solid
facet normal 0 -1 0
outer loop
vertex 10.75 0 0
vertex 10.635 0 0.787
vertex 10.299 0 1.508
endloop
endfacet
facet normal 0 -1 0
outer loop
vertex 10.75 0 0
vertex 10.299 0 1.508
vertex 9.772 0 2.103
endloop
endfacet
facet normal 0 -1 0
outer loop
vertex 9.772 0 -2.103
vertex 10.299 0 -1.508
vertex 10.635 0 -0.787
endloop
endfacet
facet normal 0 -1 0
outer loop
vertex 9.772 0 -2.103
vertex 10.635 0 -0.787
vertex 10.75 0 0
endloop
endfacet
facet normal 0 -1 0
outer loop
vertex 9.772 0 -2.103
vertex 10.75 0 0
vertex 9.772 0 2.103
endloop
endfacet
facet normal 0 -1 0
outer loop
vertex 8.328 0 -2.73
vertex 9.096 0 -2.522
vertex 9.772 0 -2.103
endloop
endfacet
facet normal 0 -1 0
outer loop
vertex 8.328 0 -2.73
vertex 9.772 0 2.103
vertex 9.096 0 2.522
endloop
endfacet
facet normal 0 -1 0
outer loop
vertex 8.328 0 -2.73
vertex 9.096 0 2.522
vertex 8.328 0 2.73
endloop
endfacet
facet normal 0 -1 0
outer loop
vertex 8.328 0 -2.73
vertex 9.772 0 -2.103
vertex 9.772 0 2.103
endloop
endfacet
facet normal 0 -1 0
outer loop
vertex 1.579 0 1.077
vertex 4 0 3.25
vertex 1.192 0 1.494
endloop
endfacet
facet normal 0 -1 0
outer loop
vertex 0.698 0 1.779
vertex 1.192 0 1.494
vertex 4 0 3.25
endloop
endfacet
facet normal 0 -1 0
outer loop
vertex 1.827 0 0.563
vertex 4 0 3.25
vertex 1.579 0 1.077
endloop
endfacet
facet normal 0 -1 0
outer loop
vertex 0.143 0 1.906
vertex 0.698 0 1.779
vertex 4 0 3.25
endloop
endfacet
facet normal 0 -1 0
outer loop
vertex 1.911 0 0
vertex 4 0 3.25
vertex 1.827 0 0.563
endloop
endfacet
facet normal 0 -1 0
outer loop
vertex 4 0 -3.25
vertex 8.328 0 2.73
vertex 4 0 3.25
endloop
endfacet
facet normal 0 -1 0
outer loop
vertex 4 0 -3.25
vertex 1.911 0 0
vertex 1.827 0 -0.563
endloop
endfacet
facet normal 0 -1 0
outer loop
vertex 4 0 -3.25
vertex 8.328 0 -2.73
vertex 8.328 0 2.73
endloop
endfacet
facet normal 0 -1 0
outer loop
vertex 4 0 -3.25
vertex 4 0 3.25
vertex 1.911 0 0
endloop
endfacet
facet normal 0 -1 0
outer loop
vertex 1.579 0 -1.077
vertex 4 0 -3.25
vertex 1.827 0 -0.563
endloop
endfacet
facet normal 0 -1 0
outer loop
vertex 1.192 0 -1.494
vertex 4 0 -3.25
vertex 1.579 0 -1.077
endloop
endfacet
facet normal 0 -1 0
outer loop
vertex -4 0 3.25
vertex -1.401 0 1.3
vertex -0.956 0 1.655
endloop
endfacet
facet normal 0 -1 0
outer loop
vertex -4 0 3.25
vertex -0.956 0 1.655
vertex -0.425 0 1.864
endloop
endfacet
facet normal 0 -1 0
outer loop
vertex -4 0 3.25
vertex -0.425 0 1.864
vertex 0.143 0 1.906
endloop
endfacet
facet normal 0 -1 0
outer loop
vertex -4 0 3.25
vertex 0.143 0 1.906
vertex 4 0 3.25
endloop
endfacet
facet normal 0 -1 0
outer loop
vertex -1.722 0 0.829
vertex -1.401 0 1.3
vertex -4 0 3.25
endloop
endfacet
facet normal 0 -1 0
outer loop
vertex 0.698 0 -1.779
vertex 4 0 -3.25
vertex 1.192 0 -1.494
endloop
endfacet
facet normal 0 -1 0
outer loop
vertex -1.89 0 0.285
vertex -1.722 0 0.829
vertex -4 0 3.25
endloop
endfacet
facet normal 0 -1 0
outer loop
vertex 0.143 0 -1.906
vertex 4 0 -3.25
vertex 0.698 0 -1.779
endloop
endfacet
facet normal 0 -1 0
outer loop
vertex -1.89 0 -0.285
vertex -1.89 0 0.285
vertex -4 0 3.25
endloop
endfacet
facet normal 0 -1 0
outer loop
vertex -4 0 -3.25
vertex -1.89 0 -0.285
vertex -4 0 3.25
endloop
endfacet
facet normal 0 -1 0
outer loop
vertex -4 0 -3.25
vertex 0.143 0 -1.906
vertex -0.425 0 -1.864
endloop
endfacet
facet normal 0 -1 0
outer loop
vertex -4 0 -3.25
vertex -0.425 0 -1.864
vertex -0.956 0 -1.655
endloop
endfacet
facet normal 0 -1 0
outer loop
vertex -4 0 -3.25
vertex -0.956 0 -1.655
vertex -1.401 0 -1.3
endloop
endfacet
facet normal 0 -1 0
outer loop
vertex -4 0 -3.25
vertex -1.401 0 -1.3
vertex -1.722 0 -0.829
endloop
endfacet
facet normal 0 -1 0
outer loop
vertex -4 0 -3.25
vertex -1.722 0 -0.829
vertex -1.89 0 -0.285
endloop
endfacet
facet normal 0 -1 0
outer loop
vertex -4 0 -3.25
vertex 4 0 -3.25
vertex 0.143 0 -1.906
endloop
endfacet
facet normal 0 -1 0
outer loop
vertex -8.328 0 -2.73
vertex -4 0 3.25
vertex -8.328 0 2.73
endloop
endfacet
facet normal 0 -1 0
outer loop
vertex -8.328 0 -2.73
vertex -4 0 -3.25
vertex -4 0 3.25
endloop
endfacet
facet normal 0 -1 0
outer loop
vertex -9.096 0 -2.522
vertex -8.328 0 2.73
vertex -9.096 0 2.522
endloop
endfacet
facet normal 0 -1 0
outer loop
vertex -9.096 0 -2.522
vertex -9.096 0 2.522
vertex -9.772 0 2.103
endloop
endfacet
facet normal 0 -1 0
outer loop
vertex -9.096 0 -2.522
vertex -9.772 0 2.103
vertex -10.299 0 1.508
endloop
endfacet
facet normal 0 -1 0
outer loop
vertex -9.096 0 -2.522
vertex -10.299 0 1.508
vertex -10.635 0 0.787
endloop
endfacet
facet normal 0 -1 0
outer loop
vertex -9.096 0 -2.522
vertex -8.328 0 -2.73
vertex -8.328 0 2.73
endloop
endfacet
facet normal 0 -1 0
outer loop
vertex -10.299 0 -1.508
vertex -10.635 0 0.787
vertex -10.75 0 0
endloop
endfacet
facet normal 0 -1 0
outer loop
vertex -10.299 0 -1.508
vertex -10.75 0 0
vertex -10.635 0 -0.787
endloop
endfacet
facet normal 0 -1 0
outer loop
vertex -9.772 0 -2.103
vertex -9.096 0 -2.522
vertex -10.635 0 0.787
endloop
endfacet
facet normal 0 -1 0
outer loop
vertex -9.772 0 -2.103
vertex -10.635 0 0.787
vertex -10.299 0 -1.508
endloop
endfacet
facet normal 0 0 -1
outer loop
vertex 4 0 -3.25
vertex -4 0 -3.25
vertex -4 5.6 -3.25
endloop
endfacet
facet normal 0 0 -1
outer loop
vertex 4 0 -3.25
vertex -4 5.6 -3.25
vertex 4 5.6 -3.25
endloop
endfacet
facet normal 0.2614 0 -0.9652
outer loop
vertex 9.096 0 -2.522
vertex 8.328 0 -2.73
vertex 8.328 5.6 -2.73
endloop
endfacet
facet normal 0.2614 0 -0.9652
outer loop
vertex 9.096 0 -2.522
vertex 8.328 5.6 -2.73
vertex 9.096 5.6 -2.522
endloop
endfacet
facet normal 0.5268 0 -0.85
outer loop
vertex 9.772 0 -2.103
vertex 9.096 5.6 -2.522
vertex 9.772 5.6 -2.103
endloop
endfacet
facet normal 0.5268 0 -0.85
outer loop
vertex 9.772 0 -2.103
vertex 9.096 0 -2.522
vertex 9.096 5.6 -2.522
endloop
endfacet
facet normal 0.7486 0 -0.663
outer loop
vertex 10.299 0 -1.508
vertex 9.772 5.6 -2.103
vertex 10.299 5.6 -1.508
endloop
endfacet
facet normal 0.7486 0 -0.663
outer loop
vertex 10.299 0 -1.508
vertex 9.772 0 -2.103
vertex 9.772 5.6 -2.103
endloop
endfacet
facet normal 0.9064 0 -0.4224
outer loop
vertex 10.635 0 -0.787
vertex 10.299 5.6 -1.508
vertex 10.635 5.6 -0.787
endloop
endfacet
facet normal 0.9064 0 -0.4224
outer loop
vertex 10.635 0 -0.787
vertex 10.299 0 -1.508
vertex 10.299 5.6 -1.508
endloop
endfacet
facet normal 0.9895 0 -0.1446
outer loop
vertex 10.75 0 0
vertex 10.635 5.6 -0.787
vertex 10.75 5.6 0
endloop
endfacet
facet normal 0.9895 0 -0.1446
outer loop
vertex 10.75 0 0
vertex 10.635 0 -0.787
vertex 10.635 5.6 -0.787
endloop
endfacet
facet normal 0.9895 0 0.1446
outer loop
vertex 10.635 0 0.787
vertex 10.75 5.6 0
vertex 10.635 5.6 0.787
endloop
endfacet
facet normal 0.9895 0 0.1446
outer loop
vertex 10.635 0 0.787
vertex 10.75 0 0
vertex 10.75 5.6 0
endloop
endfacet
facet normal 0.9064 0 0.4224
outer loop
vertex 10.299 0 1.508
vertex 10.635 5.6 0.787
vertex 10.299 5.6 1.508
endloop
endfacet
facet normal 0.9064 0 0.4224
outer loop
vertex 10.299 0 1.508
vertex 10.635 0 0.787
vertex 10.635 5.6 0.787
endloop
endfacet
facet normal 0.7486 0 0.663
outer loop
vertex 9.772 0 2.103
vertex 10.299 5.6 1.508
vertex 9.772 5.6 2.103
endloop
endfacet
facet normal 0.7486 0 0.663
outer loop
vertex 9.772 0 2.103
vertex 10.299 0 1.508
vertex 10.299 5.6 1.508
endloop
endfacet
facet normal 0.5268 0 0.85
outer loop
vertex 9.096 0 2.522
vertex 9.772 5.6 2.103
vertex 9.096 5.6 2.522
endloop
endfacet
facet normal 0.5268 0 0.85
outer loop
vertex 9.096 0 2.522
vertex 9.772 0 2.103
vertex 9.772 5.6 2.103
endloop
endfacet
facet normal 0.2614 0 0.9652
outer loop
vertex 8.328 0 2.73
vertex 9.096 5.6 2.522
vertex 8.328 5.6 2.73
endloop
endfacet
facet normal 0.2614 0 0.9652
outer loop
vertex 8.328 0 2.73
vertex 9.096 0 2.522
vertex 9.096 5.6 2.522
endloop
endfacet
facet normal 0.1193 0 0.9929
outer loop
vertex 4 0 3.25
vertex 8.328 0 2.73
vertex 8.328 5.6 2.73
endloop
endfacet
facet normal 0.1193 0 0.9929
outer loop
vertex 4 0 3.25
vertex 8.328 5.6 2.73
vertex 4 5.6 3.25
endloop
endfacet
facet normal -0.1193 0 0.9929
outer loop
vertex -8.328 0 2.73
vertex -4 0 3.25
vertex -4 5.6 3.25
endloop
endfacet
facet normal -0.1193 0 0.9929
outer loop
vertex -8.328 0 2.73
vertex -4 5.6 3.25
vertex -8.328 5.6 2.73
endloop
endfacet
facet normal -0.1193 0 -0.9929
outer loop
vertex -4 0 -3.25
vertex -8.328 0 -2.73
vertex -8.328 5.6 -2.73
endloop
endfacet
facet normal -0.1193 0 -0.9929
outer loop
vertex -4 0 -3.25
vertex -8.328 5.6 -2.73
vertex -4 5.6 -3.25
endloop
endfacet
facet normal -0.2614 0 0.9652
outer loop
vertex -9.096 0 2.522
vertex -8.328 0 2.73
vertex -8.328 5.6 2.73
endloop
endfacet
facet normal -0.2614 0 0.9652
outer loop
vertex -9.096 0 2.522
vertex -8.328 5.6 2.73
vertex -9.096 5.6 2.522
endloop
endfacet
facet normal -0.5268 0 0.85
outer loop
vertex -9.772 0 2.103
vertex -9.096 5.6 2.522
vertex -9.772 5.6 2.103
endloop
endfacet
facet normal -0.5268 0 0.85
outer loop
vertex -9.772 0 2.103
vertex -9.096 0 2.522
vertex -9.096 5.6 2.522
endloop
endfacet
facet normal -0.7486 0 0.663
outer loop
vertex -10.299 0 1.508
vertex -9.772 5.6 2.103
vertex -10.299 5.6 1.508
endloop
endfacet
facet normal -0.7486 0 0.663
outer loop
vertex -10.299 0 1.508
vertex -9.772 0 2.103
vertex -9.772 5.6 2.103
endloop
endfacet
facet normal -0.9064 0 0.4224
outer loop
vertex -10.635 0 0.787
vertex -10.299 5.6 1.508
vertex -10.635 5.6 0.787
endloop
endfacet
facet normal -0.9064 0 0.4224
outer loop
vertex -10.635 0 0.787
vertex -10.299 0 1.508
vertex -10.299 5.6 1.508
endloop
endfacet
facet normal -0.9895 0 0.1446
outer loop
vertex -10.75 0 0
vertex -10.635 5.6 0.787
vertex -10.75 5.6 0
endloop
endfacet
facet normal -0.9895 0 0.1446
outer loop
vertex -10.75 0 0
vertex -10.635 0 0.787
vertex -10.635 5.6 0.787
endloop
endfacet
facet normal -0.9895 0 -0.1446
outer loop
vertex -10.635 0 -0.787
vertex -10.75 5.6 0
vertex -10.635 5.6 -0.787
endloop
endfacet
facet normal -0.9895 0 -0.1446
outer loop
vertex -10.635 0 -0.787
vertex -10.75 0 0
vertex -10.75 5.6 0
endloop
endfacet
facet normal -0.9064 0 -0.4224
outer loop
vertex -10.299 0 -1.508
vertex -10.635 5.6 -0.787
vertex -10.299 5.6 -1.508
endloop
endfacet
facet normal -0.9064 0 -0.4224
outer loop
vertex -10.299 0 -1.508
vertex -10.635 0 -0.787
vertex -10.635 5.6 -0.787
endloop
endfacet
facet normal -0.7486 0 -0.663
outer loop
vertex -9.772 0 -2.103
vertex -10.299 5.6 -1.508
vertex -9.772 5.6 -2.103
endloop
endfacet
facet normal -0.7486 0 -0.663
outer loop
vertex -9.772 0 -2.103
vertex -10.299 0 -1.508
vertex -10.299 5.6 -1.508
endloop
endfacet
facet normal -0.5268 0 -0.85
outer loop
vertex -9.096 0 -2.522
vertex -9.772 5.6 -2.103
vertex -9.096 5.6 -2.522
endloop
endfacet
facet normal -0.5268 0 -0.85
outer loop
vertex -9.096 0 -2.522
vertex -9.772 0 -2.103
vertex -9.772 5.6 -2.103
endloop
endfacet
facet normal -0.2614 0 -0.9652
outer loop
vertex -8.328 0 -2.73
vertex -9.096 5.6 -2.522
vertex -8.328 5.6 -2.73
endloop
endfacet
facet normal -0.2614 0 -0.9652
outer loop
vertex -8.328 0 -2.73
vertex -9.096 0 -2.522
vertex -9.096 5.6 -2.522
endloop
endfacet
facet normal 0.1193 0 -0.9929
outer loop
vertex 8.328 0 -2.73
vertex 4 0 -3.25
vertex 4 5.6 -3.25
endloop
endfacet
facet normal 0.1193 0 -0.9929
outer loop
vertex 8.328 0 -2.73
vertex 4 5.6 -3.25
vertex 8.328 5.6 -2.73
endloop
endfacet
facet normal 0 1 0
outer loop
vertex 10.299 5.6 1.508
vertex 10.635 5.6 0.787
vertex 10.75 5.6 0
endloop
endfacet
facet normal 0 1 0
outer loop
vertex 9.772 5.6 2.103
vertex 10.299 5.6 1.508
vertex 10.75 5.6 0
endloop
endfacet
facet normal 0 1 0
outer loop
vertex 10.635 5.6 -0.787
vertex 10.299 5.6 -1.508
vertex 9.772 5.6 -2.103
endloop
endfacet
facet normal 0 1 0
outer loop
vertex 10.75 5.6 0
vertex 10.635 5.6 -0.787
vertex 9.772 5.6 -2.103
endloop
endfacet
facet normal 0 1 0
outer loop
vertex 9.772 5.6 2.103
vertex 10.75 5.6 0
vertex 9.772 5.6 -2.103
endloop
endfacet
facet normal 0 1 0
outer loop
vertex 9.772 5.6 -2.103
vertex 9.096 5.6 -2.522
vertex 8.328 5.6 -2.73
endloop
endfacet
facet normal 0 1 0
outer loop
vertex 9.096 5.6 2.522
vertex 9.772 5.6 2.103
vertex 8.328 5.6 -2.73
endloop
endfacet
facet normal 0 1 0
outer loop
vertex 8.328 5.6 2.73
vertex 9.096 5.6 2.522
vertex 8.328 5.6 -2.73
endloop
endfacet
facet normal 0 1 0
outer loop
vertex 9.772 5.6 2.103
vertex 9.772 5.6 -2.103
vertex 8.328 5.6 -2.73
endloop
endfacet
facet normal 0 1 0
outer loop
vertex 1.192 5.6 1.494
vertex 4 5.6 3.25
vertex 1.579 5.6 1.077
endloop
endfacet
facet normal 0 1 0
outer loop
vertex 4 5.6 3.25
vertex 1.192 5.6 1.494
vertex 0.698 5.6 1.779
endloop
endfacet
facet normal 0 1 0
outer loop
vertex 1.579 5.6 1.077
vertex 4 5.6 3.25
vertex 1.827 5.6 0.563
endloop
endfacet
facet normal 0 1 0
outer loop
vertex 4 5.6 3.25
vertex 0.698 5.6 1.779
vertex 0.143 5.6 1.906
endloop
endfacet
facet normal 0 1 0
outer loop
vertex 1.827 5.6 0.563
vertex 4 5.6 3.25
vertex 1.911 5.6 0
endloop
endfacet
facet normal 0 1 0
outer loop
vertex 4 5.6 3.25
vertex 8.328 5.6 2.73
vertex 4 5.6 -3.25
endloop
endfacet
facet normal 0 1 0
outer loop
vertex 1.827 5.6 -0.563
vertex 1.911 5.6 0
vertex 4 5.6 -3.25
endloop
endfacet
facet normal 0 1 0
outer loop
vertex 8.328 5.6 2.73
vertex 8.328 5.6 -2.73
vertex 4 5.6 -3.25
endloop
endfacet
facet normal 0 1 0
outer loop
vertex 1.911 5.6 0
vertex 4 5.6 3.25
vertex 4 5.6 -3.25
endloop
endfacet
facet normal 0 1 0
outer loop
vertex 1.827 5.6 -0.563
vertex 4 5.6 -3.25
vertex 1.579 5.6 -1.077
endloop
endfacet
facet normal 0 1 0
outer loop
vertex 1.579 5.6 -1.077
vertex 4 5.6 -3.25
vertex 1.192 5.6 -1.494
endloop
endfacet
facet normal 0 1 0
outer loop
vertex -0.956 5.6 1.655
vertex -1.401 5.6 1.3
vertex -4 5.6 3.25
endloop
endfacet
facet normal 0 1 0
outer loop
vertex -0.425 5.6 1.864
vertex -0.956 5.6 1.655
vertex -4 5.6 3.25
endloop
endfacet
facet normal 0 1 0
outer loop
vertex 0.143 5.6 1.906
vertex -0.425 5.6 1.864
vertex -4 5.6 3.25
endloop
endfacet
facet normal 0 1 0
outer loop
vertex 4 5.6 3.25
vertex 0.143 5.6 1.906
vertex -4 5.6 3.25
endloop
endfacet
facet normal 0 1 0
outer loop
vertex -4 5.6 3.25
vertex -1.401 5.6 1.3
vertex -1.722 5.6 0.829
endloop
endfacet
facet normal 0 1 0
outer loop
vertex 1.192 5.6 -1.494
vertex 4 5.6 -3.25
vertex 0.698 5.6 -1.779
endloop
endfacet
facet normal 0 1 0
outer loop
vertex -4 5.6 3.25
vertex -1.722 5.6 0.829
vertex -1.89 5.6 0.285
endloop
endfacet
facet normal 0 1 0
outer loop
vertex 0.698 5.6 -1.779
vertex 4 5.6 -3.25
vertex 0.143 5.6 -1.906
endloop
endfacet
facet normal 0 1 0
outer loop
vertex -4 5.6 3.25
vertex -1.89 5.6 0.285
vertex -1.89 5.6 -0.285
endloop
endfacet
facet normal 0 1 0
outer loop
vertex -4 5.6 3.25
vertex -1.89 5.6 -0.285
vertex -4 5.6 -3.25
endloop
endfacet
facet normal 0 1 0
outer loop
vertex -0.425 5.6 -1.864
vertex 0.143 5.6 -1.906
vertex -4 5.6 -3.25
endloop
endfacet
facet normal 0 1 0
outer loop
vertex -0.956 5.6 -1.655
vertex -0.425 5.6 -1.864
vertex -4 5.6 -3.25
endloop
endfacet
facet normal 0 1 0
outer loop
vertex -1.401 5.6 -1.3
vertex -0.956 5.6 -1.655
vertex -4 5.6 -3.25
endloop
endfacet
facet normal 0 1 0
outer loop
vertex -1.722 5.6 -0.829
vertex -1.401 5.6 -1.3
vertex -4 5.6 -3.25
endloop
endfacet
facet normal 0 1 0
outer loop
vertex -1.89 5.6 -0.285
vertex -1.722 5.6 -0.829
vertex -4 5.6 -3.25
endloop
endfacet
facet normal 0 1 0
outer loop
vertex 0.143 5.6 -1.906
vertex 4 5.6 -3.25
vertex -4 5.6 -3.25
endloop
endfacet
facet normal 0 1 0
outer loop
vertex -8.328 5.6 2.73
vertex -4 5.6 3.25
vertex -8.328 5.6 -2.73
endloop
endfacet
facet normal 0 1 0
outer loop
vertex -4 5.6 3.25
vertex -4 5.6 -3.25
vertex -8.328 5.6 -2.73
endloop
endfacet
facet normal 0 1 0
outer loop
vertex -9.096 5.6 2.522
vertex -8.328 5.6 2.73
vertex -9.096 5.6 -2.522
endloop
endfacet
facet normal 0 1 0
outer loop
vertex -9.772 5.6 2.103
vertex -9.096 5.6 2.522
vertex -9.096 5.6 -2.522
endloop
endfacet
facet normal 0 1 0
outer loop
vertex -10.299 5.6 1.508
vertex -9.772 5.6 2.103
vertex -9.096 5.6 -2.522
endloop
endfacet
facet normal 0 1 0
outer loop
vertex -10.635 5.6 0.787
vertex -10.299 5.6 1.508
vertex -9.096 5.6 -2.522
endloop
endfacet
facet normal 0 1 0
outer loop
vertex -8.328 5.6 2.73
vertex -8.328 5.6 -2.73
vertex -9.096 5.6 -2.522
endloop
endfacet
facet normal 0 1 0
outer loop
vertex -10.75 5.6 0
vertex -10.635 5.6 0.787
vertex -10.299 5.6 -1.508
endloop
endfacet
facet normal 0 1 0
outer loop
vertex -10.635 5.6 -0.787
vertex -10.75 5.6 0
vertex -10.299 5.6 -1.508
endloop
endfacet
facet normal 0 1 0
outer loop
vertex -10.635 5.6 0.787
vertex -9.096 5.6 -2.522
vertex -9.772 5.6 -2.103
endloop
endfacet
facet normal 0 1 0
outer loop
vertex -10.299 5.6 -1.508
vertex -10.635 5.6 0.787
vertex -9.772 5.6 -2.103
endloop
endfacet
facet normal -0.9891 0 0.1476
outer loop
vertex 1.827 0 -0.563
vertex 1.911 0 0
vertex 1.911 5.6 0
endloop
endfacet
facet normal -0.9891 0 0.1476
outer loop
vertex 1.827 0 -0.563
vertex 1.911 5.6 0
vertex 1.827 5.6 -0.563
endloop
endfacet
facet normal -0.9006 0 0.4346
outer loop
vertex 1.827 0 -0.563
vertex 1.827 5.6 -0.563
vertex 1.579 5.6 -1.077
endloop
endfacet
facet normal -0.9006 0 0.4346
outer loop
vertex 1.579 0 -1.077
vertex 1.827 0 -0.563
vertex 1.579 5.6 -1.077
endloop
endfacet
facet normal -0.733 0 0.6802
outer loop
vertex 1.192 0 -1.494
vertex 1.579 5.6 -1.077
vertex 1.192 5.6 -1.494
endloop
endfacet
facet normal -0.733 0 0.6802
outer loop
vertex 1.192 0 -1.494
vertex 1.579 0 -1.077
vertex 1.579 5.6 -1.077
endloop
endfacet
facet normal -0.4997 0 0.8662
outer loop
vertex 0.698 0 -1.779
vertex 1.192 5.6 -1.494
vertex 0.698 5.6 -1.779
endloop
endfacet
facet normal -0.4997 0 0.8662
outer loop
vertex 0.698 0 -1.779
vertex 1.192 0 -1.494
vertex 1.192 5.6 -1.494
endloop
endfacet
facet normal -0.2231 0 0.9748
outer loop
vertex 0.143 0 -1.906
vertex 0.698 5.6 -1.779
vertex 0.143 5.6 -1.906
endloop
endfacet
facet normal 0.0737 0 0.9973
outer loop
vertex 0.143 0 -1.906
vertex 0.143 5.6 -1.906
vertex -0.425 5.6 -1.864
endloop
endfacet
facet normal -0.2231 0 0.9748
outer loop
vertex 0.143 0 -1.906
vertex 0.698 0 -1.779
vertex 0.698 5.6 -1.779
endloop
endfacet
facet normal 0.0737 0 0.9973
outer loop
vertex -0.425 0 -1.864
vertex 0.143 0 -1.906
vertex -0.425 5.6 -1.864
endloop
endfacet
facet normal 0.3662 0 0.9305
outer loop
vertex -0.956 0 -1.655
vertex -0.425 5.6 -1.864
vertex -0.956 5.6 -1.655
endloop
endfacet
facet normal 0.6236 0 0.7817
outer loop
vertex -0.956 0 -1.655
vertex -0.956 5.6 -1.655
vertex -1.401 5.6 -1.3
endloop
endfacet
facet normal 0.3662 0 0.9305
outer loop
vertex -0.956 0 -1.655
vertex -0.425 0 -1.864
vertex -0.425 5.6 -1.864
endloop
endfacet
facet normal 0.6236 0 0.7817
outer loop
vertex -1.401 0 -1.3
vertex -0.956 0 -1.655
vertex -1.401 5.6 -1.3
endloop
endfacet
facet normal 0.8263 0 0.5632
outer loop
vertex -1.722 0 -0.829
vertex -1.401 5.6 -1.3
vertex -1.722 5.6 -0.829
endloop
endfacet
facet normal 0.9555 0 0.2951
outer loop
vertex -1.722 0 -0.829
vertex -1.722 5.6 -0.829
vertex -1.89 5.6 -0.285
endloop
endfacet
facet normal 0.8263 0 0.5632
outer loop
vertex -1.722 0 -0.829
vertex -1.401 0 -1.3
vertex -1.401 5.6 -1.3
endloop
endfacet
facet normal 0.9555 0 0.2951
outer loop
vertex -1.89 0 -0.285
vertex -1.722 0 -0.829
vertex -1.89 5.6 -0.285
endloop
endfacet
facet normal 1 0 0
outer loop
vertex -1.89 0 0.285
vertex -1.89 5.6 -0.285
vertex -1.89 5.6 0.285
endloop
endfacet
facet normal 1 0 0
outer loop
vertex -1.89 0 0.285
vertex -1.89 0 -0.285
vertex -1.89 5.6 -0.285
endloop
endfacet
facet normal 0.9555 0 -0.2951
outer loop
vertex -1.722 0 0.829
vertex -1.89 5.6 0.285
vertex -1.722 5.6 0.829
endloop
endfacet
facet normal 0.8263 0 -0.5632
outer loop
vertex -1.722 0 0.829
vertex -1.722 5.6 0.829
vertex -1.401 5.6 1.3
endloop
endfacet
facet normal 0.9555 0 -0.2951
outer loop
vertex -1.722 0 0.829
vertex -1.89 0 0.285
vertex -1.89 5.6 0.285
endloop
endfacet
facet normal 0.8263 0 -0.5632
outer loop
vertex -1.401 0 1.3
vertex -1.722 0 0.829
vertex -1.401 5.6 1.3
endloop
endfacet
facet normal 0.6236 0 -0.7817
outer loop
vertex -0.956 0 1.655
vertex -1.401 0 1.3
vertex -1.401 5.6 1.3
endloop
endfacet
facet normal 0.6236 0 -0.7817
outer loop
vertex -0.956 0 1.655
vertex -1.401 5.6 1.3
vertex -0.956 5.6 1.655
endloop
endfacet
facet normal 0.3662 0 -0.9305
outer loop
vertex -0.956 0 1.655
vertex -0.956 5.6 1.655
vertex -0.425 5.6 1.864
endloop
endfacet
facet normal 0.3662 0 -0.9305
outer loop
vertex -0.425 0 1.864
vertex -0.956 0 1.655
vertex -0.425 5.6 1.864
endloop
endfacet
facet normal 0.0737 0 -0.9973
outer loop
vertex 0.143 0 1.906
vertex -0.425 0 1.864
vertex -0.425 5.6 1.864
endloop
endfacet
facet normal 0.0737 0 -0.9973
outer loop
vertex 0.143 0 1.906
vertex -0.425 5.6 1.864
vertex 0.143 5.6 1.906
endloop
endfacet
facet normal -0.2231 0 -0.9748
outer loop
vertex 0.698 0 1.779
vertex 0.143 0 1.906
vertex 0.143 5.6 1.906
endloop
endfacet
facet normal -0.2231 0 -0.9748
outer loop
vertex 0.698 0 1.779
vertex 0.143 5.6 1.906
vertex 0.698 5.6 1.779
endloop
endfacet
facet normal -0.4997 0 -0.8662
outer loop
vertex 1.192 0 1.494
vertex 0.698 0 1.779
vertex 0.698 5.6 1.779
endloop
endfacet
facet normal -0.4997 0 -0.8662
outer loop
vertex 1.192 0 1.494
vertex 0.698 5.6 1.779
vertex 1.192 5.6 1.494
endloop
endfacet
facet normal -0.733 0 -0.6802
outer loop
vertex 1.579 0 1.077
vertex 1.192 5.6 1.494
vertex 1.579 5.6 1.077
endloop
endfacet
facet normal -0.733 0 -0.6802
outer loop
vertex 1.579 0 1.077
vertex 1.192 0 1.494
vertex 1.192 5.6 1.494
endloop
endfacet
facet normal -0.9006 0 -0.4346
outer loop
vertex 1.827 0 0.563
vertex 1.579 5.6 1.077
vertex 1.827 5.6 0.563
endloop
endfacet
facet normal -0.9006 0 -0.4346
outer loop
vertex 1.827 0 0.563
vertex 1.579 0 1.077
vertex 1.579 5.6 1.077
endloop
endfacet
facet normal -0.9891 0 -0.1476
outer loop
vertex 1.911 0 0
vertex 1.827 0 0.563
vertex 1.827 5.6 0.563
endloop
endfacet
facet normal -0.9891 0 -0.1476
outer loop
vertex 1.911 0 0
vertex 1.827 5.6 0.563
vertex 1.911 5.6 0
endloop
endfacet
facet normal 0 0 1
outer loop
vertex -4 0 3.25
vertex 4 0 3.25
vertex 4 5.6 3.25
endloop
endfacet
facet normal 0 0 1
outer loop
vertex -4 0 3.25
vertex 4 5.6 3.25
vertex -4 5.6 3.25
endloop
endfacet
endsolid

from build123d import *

# Parameters (mm, degrees)
SKETCH4_R           = 1.911425658
BOSS_EXTRUDE1_DEPTH = 5.6


with BuildPart() as part:
    # Sketch4 → Boss-Extrude1 (new body)
    with BuildSketch(Plane(origin=(0, 0, 0), x_dir=(1, 0, 0), z_dir=(0, 1, 0))):
        with BuildLine():
            Line((-4, -3.25), (-8.327817762, -2.730391092))
            ThreePointArc((-8.327817762, -2.730391092), (-10.75, 0), (-8.327817762, 2.730391092))
            Line((-8.327817762, 2.730391092), (-4, 3.25))
            Line((-4, 3.25), (4, 3.25))
            Line((4, 3.25), (8.327817762, 2.730391092))
            ThreePointArc((8.327817762, 2.730391092), (10.75, 0), (8.327817762, -2.730391092))
            Line((8.327817762, -2.730391092), (4, -3.25))
            Line((4, -3.25), (-4, -3.25))
        make_face()
        Circle(SKETCH4_R, mode=Mode.SUBTRACT)
    extrude(amount=BOSS_EXTRUDE1_DEPTH)


solid = part.part
